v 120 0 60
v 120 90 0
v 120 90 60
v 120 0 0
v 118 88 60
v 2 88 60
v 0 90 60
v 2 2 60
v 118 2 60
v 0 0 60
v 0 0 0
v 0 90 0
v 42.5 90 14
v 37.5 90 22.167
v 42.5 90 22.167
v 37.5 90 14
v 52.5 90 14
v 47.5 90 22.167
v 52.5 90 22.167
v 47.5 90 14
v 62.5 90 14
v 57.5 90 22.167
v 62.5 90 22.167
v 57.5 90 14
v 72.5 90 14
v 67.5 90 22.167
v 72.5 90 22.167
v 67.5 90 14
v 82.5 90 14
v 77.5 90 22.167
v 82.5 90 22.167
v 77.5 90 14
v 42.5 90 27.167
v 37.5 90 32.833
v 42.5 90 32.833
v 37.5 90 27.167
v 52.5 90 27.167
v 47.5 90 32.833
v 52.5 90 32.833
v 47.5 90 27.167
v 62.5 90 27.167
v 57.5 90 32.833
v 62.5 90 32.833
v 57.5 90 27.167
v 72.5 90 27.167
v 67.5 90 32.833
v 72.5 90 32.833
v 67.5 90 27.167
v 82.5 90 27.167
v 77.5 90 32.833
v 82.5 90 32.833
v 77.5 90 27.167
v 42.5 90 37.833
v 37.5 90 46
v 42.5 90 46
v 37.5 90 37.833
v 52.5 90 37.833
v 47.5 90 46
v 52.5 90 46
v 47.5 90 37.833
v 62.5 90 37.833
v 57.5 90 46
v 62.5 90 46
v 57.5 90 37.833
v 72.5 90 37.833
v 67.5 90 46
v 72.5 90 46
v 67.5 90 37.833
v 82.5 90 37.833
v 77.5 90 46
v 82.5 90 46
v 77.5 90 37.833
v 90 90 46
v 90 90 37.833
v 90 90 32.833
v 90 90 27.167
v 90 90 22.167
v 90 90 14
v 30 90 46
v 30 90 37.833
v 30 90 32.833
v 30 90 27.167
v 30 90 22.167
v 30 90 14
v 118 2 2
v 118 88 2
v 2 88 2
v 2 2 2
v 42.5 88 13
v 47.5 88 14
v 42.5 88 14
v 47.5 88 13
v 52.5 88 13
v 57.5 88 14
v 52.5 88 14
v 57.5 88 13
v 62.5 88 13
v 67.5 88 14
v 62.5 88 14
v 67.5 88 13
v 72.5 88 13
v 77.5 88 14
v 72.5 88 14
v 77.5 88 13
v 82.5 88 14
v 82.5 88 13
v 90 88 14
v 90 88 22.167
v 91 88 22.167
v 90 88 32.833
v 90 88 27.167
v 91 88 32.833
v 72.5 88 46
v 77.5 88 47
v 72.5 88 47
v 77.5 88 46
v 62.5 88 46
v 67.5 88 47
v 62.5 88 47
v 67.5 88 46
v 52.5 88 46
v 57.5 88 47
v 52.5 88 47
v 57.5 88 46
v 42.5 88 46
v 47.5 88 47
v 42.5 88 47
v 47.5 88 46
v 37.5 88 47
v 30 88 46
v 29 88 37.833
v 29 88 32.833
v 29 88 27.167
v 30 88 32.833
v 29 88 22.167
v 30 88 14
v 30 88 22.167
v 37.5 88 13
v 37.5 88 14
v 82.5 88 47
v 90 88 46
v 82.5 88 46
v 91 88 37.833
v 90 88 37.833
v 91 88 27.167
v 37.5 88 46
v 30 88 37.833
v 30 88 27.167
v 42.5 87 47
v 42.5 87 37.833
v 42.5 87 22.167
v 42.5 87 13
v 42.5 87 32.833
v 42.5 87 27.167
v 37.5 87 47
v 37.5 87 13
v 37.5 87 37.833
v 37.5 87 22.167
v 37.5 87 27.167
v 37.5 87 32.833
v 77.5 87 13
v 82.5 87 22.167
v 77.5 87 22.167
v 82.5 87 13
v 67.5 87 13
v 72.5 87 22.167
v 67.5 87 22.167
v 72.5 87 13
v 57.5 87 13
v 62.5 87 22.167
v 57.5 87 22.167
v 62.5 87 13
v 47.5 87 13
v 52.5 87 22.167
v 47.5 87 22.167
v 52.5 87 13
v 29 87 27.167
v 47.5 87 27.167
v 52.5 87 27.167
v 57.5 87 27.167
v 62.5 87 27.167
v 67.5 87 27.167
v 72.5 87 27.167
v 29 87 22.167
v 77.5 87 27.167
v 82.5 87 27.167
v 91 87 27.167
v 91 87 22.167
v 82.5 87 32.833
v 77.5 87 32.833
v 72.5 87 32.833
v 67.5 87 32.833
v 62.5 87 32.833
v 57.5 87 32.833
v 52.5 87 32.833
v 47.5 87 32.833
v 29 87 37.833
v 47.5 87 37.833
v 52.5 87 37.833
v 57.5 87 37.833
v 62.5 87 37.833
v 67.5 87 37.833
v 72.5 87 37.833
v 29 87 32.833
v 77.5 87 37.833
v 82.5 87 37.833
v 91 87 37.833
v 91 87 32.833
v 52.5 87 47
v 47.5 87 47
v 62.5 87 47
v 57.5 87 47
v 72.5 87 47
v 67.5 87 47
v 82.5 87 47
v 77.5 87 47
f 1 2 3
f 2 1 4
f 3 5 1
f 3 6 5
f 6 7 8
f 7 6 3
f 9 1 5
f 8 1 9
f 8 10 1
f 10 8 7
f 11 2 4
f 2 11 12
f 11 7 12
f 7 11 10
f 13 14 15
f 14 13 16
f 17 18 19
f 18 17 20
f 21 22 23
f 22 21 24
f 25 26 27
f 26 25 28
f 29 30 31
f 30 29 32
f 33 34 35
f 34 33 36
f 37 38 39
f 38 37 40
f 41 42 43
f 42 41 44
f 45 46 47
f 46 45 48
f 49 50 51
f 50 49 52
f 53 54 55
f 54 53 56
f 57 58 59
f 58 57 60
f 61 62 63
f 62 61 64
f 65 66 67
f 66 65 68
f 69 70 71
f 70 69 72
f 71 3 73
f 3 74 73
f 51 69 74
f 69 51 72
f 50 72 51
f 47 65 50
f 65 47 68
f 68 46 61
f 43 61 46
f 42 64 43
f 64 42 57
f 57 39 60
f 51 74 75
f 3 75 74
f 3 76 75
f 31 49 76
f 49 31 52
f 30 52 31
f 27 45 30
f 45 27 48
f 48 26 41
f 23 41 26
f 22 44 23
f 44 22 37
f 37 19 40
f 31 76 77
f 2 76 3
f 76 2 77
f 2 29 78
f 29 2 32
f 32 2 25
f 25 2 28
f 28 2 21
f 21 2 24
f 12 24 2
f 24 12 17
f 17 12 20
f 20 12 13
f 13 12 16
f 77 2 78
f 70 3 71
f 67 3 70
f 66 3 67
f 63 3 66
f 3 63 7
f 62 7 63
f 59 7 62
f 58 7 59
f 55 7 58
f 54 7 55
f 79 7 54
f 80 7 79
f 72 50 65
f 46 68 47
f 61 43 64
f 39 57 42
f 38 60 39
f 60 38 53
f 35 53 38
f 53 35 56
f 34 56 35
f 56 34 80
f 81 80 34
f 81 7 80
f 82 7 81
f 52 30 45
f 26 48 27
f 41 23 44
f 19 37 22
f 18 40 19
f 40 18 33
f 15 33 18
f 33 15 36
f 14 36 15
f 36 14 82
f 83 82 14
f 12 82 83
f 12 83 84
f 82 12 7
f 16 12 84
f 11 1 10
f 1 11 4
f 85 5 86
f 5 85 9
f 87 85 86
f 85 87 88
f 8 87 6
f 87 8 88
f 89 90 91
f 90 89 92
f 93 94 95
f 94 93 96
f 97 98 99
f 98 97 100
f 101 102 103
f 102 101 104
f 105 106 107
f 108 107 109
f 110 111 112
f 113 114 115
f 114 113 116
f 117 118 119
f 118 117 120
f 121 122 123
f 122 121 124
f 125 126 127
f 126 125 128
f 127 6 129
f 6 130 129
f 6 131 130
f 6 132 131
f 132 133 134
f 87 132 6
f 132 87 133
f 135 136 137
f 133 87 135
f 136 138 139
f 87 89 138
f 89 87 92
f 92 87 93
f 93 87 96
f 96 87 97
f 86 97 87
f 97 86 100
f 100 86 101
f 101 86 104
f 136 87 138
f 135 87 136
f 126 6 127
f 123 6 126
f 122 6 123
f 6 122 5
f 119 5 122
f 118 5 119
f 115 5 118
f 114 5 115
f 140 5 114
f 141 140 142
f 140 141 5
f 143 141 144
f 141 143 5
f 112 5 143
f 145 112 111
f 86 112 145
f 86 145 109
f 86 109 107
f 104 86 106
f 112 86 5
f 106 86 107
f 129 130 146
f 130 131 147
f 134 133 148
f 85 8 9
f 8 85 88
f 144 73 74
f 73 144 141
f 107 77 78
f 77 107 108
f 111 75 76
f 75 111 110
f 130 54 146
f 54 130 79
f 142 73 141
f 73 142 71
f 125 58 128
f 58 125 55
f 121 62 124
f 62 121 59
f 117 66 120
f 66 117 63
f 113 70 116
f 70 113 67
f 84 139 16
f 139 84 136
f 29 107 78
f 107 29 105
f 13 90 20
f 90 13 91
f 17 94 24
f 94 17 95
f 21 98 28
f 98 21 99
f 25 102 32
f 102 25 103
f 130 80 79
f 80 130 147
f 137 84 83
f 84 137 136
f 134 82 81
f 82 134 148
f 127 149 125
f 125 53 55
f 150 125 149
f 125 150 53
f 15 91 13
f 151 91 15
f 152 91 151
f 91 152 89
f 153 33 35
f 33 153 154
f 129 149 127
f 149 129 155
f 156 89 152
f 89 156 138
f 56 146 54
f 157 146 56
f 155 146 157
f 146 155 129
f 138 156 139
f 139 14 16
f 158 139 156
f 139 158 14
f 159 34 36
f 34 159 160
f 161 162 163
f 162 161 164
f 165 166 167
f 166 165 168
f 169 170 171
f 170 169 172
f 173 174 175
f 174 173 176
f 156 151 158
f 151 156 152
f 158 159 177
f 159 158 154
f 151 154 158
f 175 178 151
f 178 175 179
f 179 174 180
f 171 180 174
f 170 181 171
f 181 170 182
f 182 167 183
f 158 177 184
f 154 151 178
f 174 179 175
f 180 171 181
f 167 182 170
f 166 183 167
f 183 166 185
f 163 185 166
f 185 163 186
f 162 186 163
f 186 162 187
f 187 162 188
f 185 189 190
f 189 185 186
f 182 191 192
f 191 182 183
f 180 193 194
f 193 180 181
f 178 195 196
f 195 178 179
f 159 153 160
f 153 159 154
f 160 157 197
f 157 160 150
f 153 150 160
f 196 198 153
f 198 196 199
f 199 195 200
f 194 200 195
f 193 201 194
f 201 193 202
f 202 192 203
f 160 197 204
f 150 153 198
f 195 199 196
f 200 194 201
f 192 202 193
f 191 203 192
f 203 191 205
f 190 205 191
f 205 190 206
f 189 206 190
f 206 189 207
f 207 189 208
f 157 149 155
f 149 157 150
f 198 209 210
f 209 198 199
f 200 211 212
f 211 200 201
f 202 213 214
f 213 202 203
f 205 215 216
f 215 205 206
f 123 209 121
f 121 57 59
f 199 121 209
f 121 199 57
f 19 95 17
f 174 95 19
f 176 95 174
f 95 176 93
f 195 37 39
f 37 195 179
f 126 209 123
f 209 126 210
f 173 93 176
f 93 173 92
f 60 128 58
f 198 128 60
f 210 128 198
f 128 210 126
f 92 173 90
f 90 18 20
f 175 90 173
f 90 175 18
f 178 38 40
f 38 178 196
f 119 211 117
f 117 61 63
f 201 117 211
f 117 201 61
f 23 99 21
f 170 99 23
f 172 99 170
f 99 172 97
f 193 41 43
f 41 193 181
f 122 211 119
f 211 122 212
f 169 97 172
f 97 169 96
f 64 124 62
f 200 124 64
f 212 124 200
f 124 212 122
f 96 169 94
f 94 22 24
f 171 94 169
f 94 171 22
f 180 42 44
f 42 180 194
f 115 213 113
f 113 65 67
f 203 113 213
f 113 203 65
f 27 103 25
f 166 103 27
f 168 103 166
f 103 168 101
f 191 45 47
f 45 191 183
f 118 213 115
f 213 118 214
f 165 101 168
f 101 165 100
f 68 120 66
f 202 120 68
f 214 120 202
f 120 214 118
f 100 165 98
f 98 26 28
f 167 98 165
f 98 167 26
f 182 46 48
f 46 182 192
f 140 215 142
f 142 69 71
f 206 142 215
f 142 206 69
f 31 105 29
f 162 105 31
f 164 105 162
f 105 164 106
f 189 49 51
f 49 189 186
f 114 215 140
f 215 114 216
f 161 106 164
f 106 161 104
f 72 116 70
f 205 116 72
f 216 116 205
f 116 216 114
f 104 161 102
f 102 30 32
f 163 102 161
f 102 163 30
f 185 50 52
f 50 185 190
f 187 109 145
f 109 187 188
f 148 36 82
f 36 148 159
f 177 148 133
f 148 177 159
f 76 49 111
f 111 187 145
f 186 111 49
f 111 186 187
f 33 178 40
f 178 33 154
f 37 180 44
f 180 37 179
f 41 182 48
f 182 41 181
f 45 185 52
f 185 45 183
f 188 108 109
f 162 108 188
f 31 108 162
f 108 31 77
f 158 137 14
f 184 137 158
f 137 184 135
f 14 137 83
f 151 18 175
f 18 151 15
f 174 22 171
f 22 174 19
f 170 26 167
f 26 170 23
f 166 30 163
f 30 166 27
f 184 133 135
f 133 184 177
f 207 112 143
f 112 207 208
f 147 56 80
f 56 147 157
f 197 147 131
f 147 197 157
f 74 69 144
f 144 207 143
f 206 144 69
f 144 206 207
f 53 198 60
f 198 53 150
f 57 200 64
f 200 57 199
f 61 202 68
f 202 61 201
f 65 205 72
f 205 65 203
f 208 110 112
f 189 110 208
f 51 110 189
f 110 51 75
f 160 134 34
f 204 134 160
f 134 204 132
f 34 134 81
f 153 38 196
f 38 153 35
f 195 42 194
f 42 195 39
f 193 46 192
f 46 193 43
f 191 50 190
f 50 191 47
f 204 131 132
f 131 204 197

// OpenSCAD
$fn = 32;

// ----------------------------------------------------------------------
// Vent box: crossgrid enclosure
// ----------------------------------------------------------------------

// --- parameters (mm) ---
box_l = 120;              // box length, X
box_w = 90;               // box width, Y
box_h = 60;               // box height, Z
wall_t = 2;               // shell wall thickness
win_l = 60;               // vent window width, X
win_h = 32;               // vent window height, Z
bar_w = 5;                // grid bar width
n_v = 5;                  // vertical bar count
n_h = 2;                  // horizontal bar count

win_z0 = (box_h - win_h) / 2;  // window lower edge Z
v_step = win_l / (n_v + 1);  // vertical bar step
h_step = win_h / (n_h + 1);  // horizontal bar step

difference() {
  union() {
    difference() {
      cube([box_l, box_w, box_h]);
  translate([wall_t, wall_t, wall_t])
    cube([box_l - 2 * wall_t, box_w - 2 * wall_t, box_h]);
  translate([(box_l - win_l) / 2, box_w - wall_t - 1, win_z0])
    cube([win_l, wall_t + 2, win_h]);
    }
    for (i = [1 : n_v])
      translate([(box_l - win_l) / 2 + i * v_step - bar_w / 2,
                 box_w - wall_t - 1, win_z0 - 1])
        cube([bar_w, wall_t + 1, win_h + 2]);
    for (i = [1 : n_h])
      translate([(box_l - win_l) / 2 - 1, box_w - wall_t - 1,
                 win_z0 + i * h_step - bar_w / 2])
        cube([win_l + 2, wall_t + 1, bar_w]);
  }
}
